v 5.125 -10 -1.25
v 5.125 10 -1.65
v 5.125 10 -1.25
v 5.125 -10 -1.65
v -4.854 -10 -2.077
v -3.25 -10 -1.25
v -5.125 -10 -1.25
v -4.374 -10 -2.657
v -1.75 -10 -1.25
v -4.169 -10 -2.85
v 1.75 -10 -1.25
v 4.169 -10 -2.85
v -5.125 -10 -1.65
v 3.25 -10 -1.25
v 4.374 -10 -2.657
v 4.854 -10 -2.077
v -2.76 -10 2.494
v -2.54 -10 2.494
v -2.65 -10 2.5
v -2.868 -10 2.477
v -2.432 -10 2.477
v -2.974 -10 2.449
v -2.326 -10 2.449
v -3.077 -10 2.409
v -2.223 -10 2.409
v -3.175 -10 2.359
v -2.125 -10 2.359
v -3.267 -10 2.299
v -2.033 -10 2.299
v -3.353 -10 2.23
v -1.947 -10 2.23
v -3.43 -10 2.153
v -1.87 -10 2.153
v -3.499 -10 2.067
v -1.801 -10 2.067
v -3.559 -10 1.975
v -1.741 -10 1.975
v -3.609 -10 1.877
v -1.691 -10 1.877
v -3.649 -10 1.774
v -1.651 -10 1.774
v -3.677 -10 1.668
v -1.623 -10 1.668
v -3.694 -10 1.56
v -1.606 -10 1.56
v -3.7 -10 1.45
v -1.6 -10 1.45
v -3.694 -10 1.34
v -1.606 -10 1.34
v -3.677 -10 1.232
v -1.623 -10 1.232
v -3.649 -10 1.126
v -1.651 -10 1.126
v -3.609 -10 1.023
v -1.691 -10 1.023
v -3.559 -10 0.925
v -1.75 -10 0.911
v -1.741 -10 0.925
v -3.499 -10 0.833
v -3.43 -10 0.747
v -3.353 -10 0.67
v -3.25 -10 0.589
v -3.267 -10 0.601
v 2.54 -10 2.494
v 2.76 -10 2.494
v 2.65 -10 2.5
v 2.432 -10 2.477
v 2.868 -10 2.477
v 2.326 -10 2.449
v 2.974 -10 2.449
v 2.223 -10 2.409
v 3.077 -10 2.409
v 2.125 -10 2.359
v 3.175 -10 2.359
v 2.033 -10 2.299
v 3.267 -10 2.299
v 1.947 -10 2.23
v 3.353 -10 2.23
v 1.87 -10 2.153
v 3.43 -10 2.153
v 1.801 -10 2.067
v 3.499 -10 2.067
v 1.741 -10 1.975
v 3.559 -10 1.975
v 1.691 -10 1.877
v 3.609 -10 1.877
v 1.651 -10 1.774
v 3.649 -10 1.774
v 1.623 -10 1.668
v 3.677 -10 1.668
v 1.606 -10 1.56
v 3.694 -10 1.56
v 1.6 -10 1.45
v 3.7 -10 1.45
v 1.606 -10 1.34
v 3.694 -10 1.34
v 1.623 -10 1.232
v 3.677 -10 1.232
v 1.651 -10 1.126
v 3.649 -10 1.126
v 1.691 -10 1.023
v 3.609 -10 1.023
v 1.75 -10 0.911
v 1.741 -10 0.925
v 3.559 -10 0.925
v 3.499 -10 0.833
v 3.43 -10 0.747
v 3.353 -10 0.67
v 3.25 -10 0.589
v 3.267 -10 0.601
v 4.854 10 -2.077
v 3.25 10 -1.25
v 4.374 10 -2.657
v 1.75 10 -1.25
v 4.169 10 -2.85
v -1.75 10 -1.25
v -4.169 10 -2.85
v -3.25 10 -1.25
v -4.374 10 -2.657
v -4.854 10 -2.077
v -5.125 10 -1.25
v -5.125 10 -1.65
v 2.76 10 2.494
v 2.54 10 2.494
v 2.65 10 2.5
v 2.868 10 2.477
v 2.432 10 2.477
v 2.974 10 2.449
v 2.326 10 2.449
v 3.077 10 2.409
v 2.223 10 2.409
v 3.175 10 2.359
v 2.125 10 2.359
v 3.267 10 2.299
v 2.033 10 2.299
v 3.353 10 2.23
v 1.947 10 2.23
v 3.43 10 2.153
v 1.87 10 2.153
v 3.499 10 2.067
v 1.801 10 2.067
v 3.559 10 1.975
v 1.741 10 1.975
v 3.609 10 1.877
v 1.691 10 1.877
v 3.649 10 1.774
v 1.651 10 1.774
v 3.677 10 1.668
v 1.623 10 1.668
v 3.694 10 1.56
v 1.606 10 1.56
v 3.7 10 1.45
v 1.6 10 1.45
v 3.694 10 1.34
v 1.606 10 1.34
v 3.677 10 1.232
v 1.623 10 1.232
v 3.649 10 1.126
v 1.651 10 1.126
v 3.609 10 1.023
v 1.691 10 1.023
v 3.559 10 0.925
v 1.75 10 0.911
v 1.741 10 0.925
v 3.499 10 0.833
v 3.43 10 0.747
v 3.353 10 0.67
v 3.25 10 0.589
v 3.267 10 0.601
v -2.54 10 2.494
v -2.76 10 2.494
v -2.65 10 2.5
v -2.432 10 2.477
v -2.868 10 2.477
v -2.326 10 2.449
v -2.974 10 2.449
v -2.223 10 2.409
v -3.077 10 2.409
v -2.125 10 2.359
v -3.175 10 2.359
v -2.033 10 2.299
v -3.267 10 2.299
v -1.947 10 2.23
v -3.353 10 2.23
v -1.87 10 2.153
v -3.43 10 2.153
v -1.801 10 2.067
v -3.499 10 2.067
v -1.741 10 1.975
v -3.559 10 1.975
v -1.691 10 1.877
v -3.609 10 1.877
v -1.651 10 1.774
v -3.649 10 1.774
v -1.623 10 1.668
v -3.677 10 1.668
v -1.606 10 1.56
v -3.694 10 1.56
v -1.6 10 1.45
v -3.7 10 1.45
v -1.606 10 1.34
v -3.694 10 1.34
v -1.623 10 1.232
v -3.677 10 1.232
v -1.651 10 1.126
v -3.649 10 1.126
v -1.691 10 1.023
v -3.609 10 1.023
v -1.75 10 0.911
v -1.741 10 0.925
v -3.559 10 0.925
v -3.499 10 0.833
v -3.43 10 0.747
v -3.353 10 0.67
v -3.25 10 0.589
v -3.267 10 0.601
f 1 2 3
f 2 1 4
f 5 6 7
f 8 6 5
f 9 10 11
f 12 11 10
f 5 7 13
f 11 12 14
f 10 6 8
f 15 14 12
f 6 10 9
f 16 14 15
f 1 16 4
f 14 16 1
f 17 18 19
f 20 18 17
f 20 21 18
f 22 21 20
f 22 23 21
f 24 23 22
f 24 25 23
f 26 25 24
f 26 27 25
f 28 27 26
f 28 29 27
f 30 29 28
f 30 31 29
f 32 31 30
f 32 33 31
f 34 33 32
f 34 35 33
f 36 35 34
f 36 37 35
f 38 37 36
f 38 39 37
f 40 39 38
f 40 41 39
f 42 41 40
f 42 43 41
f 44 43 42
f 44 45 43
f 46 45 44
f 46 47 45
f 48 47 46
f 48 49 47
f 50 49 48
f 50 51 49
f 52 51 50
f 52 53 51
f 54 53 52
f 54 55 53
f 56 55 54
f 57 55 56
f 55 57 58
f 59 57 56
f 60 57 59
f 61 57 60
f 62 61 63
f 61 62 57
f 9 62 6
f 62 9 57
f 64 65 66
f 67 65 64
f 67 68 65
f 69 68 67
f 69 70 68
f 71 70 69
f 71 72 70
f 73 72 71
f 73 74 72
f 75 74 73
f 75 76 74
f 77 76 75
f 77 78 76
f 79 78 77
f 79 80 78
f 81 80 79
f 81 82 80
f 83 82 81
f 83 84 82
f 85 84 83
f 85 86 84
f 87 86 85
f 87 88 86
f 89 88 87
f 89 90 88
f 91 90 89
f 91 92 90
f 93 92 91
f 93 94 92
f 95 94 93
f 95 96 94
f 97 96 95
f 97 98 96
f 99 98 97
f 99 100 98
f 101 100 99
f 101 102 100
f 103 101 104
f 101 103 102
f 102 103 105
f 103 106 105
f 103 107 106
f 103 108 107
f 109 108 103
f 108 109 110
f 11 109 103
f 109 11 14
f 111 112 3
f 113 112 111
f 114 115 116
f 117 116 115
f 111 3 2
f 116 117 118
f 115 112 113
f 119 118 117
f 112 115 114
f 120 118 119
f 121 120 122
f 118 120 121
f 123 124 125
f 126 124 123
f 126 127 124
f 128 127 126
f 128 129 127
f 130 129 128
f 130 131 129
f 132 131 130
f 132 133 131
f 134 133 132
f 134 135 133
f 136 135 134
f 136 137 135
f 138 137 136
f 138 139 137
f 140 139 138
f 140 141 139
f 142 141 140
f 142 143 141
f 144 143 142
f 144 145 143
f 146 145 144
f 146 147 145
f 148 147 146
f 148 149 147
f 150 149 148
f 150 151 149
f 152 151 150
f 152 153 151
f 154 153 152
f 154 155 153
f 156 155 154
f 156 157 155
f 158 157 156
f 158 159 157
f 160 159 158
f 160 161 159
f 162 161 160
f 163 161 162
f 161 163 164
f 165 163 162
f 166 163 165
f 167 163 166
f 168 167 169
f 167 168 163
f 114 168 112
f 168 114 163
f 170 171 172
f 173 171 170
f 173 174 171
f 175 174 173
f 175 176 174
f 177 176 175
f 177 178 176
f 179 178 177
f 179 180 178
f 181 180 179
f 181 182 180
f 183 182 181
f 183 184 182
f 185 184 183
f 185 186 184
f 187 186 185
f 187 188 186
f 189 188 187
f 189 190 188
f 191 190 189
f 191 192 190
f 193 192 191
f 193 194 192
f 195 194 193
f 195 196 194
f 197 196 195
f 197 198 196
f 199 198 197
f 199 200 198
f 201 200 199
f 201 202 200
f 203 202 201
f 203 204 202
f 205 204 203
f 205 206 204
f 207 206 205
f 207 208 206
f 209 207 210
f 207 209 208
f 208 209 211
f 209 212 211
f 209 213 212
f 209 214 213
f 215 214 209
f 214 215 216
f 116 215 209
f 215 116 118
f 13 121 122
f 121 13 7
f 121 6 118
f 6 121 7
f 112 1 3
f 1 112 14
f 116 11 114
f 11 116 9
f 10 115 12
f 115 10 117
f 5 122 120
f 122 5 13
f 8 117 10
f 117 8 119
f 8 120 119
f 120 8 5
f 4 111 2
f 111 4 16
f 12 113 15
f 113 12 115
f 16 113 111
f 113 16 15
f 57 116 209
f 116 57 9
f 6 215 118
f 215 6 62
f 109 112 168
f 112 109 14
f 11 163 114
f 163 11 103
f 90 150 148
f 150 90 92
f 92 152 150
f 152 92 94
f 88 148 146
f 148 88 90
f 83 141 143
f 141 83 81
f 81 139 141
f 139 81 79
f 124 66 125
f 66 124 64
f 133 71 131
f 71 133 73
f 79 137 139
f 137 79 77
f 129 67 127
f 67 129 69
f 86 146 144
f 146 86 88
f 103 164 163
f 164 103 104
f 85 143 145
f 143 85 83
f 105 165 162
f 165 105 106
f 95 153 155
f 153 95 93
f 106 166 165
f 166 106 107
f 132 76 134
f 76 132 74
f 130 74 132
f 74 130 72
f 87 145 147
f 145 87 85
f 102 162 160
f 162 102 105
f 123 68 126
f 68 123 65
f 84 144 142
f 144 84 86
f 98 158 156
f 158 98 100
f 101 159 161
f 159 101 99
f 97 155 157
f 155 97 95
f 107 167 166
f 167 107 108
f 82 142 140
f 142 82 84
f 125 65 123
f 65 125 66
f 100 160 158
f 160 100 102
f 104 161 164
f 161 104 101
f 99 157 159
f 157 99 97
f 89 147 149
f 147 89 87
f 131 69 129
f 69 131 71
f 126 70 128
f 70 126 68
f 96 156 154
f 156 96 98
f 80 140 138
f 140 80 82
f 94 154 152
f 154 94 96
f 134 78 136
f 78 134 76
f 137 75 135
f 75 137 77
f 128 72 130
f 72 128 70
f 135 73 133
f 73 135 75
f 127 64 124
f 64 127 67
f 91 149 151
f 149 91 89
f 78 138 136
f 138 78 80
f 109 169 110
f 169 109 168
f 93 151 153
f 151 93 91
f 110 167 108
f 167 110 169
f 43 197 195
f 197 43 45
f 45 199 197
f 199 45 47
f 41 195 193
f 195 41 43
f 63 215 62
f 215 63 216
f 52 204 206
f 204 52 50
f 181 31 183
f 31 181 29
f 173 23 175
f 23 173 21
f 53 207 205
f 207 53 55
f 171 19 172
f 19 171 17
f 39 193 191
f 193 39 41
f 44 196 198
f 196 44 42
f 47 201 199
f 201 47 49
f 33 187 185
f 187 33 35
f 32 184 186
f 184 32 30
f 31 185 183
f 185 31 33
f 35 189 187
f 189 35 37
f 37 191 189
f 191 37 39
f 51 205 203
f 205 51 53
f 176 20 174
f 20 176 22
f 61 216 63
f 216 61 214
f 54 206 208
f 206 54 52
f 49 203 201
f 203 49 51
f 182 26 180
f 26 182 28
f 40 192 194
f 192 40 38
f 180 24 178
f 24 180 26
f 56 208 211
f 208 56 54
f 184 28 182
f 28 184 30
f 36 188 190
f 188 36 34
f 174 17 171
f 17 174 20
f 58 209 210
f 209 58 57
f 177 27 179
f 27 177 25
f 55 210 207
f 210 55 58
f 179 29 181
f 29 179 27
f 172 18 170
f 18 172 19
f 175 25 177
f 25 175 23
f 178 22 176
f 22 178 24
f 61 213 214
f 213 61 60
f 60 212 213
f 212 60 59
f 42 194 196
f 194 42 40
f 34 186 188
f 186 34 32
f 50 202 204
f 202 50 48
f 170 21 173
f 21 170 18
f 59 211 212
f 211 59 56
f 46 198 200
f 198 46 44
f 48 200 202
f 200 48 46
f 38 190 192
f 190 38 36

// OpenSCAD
cover_length = 20; // the length of the cover

/* [Hidden] */
wing_width = 1.5;

module cover(cover_len)
{

	union() {

		translate([0, -2.2/2 - .95, 0])

			intersection() {
				cube([20.5/2, 1.6, cover_len], center=true);
				translate([0, 3.5, 0])
					cylinder(r=6, h=cover_len, $fn=50, center=true);
	
			}

		translate([-6.5/2 + wing_width/2,0,0])
			cube([wing_width,  2.75, cover_len], center=true);

		translate([6.5/2 - wing_width/2,0,0])
			cube([wing_width, 2.75, cover_len], center=true);

		translate([6.5/2 - wing_width/2 + 0.15, 2.2/2 + 0.35, 0])
			cylinder(r=1.05, h=cover_len, center=true, $fn=60);

		translate([-6.5/2 + wing_width/2 - 0.15, 2.2/2 + 0.35, 0])
			cylinder(r=1.05, h=cover_len, center=true, $fn=60);
	}
}

rotate([90, 0, 0])
	cover(cover_length);
